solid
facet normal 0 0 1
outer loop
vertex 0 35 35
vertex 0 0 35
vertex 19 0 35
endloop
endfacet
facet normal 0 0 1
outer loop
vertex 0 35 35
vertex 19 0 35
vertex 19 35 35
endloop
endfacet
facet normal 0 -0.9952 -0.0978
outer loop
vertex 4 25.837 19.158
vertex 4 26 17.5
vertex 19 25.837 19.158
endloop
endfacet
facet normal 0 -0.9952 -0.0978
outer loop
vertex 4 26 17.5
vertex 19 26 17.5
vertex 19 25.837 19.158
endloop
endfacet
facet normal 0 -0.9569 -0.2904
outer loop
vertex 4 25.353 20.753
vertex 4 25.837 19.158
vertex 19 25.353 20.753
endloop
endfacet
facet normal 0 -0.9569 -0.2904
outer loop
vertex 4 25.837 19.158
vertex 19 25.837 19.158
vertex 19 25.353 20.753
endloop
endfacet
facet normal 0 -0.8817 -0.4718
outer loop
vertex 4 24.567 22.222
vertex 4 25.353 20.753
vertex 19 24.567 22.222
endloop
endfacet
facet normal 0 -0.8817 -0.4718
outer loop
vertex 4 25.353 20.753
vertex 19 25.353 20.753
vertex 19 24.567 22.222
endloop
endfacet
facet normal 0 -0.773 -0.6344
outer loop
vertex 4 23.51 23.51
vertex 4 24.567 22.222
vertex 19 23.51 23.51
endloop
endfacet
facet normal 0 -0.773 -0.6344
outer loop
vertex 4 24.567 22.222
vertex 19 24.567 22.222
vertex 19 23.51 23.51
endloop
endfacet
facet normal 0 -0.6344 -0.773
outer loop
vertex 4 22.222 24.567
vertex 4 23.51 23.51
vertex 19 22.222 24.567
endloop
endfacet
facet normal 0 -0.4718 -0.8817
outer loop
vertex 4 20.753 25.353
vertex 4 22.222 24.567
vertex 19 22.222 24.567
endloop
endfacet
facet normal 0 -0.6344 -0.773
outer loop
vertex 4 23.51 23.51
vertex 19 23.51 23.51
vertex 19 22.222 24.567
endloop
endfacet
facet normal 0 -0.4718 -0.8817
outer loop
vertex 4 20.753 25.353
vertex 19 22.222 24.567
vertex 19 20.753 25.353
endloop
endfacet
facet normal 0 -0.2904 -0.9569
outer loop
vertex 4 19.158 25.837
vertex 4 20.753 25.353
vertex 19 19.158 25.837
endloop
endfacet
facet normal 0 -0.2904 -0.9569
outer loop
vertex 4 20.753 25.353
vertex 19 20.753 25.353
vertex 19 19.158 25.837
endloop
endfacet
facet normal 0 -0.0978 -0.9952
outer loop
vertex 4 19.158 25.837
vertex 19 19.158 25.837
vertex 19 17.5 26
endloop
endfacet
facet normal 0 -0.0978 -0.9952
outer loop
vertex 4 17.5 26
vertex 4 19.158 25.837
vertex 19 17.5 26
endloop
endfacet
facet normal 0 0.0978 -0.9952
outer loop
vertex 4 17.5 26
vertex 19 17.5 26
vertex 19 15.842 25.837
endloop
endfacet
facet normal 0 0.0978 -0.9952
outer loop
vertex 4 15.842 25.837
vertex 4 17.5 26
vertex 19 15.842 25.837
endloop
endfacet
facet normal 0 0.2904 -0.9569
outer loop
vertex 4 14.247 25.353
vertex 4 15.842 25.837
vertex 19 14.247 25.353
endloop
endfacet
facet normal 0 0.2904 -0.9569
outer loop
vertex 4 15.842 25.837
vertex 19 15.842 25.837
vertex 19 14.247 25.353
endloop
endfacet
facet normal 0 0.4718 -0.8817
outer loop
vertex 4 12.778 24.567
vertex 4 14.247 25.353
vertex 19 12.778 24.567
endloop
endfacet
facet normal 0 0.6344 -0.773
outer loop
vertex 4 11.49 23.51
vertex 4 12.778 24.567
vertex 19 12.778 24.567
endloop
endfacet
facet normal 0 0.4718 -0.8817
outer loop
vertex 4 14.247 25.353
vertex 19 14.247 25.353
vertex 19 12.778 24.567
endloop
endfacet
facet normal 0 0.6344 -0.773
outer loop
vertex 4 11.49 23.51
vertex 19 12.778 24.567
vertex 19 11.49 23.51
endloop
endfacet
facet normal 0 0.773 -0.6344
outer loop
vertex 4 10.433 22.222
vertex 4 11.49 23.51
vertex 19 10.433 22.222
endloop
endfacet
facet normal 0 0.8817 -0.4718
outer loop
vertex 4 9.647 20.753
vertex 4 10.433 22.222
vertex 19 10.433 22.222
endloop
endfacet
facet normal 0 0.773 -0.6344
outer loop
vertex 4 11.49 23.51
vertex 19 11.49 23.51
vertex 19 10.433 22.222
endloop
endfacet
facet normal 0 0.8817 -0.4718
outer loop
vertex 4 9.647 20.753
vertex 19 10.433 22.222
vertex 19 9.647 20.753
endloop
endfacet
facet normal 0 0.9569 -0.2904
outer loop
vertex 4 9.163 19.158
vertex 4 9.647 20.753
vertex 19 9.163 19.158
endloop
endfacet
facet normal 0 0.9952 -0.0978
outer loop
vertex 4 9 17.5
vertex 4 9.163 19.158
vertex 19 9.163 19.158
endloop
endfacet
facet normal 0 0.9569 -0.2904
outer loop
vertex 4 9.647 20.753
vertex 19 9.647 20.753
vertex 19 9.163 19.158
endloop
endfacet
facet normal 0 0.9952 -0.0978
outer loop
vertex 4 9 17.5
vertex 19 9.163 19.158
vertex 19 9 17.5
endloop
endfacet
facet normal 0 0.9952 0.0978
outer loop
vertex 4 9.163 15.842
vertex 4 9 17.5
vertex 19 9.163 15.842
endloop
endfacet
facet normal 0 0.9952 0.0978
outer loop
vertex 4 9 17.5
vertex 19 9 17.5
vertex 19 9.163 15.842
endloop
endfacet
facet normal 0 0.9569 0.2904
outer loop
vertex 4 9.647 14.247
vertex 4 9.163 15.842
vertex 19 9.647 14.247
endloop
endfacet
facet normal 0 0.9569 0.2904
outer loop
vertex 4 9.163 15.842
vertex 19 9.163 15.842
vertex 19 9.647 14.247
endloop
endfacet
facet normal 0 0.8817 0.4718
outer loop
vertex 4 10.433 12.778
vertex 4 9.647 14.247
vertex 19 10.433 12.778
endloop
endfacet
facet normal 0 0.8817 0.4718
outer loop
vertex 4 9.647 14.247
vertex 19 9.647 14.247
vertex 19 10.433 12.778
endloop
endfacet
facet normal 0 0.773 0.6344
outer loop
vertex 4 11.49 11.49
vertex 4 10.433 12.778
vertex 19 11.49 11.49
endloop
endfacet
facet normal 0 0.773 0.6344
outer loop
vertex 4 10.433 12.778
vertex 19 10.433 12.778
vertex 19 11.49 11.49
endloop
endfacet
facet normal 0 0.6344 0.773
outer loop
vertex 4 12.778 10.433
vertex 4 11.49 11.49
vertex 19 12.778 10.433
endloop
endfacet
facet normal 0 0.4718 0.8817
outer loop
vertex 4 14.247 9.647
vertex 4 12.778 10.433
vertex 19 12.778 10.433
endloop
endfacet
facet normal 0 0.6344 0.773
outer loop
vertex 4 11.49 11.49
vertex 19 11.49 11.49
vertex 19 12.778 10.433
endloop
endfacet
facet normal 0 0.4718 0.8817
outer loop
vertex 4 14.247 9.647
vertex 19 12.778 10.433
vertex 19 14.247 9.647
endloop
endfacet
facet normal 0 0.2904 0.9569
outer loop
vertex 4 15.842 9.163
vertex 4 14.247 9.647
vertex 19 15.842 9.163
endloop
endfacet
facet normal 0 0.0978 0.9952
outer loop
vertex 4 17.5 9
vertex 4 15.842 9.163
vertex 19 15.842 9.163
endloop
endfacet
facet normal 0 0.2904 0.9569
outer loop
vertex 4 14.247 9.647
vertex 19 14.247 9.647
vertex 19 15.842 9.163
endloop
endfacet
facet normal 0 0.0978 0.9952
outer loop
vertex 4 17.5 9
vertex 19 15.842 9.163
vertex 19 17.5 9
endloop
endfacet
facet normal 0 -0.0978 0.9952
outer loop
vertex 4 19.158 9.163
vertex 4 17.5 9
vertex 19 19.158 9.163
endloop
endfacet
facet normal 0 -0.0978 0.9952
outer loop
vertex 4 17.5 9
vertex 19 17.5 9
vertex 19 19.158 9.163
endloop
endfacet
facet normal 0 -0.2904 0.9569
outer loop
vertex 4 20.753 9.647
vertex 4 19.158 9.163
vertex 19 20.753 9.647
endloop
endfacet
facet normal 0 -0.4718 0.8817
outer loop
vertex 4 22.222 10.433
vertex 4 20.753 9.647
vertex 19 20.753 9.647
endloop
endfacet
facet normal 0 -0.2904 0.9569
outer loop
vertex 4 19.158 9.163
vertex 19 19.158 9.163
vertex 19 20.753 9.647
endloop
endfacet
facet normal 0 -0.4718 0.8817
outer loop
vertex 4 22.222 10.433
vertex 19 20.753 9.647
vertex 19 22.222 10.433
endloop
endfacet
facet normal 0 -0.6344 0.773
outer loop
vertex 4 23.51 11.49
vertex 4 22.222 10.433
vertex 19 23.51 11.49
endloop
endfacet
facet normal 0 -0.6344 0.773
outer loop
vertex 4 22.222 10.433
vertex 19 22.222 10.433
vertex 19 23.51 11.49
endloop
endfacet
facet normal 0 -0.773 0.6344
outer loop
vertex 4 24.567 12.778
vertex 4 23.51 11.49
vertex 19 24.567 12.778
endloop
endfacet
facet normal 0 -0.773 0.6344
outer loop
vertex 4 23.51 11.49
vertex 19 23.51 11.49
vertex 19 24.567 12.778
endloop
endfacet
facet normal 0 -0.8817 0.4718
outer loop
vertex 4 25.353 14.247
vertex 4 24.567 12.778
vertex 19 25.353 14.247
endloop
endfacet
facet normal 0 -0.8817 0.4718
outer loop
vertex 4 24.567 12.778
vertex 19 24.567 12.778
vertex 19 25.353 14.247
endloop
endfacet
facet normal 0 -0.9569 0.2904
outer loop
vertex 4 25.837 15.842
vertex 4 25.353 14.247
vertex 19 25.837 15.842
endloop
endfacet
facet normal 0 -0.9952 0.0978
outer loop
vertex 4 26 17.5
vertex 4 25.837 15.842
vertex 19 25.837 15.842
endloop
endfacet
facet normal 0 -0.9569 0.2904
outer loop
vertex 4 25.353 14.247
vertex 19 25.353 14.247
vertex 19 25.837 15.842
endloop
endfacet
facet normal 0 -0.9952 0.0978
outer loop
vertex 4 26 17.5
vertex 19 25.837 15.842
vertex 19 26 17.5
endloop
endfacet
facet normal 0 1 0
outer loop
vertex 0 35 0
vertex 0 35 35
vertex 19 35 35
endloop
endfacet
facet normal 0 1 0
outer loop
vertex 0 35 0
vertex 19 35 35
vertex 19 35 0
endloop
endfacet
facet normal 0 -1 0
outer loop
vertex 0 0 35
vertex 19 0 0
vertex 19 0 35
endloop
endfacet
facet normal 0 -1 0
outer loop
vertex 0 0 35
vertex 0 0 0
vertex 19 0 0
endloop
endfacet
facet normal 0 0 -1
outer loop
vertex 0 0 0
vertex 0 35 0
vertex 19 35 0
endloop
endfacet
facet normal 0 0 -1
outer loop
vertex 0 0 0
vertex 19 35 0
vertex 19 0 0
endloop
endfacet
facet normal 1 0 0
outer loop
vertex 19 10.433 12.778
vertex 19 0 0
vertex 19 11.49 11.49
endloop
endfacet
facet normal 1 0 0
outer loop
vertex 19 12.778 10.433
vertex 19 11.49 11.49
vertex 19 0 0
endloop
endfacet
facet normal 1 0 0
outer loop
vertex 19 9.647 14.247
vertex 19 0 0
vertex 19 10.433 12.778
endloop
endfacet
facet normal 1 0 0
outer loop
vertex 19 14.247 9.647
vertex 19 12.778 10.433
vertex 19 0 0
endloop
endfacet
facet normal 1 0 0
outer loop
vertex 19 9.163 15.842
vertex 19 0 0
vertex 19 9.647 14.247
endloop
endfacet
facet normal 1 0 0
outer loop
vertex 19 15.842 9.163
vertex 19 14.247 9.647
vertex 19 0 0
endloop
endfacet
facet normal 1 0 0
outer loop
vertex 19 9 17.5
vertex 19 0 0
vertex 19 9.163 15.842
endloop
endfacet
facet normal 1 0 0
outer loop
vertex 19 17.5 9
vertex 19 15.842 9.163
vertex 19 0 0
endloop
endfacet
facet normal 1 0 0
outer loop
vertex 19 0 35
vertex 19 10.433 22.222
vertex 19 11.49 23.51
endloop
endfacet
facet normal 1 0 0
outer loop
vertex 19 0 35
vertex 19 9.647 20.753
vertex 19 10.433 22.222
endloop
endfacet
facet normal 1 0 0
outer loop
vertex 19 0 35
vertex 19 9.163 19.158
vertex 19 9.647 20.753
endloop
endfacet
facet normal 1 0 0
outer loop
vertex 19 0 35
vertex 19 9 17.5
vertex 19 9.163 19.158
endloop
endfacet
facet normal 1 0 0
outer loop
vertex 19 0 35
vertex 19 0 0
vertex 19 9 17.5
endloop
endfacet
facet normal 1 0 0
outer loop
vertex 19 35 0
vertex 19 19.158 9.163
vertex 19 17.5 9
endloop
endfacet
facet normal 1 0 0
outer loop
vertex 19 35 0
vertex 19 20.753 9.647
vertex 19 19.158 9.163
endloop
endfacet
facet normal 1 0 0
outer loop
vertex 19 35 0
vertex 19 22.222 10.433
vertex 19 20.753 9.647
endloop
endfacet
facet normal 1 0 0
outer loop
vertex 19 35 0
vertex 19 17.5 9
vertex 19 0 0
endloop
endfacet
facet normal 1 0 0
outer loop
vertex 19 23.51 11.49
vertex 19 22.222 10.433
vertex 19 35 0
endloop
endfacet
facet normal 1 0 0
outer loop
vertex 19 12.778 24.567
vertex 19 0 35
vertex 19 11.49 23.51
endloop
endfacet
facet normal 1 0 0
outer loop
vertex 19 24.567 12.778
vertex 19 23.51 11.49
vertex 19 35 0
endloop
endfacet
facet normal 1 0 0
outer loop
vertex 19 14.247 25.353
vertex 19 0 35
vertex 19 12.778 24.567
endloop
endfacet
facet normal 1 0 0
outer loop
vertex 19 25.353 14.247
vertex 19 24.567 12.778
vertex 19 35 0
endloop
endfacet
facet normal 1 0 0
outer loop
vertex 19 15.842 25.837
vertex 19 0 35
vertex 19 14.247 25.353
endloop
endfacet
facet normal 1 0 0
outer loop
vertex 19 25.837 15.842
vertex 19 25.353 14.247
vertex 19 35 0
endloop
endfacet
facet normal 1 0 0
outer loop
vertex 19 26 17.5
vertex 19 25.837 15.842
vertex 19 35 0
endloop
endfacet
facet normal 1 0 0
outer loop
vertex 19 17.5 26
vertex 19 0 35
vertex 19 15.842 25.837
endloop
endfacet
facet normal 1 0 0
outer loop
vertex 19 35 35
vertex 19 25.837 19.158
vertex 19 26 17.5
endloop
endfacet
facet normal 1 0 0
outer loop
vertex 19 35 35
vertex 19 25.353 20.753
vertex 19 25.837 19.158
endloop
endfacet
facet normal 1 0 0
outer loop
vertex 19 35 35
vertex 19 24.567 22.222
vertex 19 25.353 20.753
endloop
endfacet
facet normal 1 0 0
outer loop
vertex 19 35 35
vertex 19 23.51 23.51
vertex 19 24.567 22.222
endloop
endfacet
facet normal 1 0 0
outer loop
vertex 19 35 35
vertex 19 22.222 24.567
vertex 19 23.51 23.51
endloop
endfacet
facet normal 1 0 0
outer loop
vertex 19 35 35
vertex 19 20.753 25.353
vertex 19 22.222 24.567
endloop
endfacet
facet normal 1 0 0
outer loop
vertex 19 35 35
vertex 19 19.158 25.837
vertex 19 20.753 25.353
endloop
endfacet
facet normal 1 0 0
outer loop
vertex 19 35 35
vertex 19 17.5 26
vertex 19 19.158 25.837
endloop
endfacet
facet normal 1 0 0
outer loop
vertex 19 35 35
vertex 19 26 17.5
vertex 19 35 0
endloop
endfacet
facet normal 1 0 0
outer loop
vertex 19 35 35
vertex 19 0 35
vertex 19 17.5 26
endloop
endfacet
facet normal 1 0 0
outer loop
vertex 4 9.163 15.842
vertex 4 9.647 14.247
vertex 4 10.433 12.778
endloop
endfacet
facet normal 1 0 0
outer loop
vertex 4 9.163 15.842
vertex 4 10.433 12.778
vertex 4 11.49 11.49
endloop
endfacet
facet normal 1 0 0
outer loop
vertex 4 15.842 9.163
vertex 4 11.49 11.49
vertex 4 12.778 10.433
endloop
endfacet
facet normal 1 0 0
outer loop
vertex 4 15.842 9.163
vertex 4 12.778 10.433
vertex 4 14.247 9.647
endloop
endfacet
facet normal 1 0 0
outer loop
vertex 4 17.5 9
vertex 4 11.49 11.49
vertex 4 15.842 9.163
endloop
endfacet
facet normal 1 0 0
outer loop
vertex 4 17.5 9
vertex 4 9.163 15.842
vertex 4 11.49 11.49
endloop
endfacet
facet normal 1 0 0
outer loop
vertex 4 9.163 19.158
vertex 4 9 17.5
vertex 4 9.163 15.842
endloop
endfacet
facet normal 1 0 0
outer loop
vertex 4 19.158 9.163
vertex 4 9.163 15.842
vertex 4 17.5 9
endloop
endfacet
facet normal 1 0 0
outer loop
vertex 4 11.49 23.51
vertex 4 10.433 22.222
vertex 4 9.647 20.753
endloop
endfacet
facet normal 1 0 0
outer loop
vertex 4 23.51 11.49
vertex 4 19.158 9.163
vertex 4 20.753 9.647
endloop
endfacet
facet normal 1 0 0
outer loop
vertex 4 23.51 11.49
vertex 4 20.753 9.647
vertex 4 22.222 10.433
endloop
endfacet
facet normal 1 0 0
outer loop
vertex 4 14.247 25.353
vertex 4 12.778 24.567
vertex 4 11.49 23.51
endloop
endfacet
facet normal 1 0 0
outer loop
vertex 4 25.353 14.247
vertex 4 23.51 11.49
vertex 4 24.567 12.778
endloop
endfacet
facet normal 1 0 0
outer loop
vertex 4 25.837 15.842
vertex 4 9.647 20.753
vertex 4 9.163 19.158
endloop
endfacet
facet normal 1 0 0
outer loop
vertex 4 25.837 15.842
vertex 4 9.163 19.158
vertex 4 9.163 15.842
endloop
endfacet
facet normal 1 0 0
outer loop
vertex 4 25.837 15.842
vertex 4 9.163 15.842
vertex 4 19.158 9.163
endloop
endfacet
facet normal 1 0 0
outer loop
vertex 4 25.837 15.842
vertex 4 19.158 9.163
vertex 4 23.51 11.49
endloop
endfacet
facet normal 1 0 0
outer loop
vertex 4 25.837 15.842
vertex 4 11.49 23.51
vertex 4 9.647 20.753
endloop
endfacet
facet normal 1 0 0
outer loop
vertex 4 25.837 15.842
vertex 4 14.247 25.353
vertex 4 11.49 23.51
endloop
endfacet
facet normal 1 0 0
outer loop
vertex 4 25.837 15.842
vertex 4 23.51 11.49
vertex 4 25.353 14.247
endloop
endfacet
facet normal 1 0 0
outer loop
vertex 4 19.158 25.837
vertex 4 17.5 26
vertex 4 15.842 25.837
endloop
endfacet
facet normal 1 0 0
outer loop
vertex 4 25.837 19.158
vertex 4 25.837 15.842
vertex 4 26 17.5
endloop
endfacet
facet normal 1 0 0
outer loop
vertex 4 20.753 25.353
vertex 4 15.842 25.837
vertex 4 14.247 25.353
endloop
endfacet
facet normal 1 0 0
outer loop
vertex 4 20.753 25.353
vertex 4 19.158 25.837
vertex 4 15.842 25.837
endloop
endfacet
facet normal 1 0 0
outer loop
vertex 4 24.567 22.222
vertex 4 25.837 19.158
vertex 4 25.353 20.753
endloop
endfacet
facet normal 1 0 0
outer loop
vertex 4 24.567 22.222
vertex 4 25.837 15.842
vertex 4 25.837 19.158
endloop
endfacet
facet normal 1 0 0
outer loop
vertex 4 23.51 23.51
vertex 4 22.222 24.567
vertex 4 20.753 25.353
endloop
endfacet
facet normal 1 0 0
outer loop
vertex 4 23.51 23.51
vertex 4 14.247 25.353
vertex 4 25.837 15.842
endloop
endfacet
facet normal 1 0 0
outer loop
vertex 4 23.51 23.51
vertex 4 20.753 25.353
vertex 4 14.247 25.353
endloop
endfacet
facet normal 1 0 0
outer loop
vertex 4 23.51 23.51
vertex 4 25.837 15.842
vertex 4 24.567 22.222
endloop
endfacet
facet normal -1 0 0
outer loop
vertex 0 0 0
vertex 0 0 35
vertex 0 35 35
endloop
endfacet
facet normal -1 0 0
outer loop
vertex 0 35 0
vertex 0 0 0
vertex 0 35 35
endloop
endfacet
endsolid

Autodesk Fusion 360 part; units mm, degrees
sketch "Boceto1" plane through (0, 0, 0) normal (1, 0, 0) x (0, 1, 0)
  line L0 (0, 0) -> (0, 35)
  line L1 (0, 35) -> (35, 35)
  line L2 (35, 35) -> (35, 0)
  line L3 (35, 0) -> (0, 0)
  dimension "d1" = 35
  dimension "d2" = 35
extrude "Extruir1" add sketch "Boceto1" along normal blind 19
sketch "Boceto2" plane through (19, 0, 0) normal (1, 0, 0) x (0, 1, 0)
  line L0 (35, 0) -> (35, 35)
  line L1 (35, 35) -> (0, 35)
  line L2 (0, 35) -> (0, 0)
  line L3 (0, 0) -> (35, 0)
  circle A0 centre (17.5, 17.5) radius 8.5
  dimension "d5" = 17
extrude "Extruir2" cut sketch "Boceto2" against normal blind 15 contours A0
